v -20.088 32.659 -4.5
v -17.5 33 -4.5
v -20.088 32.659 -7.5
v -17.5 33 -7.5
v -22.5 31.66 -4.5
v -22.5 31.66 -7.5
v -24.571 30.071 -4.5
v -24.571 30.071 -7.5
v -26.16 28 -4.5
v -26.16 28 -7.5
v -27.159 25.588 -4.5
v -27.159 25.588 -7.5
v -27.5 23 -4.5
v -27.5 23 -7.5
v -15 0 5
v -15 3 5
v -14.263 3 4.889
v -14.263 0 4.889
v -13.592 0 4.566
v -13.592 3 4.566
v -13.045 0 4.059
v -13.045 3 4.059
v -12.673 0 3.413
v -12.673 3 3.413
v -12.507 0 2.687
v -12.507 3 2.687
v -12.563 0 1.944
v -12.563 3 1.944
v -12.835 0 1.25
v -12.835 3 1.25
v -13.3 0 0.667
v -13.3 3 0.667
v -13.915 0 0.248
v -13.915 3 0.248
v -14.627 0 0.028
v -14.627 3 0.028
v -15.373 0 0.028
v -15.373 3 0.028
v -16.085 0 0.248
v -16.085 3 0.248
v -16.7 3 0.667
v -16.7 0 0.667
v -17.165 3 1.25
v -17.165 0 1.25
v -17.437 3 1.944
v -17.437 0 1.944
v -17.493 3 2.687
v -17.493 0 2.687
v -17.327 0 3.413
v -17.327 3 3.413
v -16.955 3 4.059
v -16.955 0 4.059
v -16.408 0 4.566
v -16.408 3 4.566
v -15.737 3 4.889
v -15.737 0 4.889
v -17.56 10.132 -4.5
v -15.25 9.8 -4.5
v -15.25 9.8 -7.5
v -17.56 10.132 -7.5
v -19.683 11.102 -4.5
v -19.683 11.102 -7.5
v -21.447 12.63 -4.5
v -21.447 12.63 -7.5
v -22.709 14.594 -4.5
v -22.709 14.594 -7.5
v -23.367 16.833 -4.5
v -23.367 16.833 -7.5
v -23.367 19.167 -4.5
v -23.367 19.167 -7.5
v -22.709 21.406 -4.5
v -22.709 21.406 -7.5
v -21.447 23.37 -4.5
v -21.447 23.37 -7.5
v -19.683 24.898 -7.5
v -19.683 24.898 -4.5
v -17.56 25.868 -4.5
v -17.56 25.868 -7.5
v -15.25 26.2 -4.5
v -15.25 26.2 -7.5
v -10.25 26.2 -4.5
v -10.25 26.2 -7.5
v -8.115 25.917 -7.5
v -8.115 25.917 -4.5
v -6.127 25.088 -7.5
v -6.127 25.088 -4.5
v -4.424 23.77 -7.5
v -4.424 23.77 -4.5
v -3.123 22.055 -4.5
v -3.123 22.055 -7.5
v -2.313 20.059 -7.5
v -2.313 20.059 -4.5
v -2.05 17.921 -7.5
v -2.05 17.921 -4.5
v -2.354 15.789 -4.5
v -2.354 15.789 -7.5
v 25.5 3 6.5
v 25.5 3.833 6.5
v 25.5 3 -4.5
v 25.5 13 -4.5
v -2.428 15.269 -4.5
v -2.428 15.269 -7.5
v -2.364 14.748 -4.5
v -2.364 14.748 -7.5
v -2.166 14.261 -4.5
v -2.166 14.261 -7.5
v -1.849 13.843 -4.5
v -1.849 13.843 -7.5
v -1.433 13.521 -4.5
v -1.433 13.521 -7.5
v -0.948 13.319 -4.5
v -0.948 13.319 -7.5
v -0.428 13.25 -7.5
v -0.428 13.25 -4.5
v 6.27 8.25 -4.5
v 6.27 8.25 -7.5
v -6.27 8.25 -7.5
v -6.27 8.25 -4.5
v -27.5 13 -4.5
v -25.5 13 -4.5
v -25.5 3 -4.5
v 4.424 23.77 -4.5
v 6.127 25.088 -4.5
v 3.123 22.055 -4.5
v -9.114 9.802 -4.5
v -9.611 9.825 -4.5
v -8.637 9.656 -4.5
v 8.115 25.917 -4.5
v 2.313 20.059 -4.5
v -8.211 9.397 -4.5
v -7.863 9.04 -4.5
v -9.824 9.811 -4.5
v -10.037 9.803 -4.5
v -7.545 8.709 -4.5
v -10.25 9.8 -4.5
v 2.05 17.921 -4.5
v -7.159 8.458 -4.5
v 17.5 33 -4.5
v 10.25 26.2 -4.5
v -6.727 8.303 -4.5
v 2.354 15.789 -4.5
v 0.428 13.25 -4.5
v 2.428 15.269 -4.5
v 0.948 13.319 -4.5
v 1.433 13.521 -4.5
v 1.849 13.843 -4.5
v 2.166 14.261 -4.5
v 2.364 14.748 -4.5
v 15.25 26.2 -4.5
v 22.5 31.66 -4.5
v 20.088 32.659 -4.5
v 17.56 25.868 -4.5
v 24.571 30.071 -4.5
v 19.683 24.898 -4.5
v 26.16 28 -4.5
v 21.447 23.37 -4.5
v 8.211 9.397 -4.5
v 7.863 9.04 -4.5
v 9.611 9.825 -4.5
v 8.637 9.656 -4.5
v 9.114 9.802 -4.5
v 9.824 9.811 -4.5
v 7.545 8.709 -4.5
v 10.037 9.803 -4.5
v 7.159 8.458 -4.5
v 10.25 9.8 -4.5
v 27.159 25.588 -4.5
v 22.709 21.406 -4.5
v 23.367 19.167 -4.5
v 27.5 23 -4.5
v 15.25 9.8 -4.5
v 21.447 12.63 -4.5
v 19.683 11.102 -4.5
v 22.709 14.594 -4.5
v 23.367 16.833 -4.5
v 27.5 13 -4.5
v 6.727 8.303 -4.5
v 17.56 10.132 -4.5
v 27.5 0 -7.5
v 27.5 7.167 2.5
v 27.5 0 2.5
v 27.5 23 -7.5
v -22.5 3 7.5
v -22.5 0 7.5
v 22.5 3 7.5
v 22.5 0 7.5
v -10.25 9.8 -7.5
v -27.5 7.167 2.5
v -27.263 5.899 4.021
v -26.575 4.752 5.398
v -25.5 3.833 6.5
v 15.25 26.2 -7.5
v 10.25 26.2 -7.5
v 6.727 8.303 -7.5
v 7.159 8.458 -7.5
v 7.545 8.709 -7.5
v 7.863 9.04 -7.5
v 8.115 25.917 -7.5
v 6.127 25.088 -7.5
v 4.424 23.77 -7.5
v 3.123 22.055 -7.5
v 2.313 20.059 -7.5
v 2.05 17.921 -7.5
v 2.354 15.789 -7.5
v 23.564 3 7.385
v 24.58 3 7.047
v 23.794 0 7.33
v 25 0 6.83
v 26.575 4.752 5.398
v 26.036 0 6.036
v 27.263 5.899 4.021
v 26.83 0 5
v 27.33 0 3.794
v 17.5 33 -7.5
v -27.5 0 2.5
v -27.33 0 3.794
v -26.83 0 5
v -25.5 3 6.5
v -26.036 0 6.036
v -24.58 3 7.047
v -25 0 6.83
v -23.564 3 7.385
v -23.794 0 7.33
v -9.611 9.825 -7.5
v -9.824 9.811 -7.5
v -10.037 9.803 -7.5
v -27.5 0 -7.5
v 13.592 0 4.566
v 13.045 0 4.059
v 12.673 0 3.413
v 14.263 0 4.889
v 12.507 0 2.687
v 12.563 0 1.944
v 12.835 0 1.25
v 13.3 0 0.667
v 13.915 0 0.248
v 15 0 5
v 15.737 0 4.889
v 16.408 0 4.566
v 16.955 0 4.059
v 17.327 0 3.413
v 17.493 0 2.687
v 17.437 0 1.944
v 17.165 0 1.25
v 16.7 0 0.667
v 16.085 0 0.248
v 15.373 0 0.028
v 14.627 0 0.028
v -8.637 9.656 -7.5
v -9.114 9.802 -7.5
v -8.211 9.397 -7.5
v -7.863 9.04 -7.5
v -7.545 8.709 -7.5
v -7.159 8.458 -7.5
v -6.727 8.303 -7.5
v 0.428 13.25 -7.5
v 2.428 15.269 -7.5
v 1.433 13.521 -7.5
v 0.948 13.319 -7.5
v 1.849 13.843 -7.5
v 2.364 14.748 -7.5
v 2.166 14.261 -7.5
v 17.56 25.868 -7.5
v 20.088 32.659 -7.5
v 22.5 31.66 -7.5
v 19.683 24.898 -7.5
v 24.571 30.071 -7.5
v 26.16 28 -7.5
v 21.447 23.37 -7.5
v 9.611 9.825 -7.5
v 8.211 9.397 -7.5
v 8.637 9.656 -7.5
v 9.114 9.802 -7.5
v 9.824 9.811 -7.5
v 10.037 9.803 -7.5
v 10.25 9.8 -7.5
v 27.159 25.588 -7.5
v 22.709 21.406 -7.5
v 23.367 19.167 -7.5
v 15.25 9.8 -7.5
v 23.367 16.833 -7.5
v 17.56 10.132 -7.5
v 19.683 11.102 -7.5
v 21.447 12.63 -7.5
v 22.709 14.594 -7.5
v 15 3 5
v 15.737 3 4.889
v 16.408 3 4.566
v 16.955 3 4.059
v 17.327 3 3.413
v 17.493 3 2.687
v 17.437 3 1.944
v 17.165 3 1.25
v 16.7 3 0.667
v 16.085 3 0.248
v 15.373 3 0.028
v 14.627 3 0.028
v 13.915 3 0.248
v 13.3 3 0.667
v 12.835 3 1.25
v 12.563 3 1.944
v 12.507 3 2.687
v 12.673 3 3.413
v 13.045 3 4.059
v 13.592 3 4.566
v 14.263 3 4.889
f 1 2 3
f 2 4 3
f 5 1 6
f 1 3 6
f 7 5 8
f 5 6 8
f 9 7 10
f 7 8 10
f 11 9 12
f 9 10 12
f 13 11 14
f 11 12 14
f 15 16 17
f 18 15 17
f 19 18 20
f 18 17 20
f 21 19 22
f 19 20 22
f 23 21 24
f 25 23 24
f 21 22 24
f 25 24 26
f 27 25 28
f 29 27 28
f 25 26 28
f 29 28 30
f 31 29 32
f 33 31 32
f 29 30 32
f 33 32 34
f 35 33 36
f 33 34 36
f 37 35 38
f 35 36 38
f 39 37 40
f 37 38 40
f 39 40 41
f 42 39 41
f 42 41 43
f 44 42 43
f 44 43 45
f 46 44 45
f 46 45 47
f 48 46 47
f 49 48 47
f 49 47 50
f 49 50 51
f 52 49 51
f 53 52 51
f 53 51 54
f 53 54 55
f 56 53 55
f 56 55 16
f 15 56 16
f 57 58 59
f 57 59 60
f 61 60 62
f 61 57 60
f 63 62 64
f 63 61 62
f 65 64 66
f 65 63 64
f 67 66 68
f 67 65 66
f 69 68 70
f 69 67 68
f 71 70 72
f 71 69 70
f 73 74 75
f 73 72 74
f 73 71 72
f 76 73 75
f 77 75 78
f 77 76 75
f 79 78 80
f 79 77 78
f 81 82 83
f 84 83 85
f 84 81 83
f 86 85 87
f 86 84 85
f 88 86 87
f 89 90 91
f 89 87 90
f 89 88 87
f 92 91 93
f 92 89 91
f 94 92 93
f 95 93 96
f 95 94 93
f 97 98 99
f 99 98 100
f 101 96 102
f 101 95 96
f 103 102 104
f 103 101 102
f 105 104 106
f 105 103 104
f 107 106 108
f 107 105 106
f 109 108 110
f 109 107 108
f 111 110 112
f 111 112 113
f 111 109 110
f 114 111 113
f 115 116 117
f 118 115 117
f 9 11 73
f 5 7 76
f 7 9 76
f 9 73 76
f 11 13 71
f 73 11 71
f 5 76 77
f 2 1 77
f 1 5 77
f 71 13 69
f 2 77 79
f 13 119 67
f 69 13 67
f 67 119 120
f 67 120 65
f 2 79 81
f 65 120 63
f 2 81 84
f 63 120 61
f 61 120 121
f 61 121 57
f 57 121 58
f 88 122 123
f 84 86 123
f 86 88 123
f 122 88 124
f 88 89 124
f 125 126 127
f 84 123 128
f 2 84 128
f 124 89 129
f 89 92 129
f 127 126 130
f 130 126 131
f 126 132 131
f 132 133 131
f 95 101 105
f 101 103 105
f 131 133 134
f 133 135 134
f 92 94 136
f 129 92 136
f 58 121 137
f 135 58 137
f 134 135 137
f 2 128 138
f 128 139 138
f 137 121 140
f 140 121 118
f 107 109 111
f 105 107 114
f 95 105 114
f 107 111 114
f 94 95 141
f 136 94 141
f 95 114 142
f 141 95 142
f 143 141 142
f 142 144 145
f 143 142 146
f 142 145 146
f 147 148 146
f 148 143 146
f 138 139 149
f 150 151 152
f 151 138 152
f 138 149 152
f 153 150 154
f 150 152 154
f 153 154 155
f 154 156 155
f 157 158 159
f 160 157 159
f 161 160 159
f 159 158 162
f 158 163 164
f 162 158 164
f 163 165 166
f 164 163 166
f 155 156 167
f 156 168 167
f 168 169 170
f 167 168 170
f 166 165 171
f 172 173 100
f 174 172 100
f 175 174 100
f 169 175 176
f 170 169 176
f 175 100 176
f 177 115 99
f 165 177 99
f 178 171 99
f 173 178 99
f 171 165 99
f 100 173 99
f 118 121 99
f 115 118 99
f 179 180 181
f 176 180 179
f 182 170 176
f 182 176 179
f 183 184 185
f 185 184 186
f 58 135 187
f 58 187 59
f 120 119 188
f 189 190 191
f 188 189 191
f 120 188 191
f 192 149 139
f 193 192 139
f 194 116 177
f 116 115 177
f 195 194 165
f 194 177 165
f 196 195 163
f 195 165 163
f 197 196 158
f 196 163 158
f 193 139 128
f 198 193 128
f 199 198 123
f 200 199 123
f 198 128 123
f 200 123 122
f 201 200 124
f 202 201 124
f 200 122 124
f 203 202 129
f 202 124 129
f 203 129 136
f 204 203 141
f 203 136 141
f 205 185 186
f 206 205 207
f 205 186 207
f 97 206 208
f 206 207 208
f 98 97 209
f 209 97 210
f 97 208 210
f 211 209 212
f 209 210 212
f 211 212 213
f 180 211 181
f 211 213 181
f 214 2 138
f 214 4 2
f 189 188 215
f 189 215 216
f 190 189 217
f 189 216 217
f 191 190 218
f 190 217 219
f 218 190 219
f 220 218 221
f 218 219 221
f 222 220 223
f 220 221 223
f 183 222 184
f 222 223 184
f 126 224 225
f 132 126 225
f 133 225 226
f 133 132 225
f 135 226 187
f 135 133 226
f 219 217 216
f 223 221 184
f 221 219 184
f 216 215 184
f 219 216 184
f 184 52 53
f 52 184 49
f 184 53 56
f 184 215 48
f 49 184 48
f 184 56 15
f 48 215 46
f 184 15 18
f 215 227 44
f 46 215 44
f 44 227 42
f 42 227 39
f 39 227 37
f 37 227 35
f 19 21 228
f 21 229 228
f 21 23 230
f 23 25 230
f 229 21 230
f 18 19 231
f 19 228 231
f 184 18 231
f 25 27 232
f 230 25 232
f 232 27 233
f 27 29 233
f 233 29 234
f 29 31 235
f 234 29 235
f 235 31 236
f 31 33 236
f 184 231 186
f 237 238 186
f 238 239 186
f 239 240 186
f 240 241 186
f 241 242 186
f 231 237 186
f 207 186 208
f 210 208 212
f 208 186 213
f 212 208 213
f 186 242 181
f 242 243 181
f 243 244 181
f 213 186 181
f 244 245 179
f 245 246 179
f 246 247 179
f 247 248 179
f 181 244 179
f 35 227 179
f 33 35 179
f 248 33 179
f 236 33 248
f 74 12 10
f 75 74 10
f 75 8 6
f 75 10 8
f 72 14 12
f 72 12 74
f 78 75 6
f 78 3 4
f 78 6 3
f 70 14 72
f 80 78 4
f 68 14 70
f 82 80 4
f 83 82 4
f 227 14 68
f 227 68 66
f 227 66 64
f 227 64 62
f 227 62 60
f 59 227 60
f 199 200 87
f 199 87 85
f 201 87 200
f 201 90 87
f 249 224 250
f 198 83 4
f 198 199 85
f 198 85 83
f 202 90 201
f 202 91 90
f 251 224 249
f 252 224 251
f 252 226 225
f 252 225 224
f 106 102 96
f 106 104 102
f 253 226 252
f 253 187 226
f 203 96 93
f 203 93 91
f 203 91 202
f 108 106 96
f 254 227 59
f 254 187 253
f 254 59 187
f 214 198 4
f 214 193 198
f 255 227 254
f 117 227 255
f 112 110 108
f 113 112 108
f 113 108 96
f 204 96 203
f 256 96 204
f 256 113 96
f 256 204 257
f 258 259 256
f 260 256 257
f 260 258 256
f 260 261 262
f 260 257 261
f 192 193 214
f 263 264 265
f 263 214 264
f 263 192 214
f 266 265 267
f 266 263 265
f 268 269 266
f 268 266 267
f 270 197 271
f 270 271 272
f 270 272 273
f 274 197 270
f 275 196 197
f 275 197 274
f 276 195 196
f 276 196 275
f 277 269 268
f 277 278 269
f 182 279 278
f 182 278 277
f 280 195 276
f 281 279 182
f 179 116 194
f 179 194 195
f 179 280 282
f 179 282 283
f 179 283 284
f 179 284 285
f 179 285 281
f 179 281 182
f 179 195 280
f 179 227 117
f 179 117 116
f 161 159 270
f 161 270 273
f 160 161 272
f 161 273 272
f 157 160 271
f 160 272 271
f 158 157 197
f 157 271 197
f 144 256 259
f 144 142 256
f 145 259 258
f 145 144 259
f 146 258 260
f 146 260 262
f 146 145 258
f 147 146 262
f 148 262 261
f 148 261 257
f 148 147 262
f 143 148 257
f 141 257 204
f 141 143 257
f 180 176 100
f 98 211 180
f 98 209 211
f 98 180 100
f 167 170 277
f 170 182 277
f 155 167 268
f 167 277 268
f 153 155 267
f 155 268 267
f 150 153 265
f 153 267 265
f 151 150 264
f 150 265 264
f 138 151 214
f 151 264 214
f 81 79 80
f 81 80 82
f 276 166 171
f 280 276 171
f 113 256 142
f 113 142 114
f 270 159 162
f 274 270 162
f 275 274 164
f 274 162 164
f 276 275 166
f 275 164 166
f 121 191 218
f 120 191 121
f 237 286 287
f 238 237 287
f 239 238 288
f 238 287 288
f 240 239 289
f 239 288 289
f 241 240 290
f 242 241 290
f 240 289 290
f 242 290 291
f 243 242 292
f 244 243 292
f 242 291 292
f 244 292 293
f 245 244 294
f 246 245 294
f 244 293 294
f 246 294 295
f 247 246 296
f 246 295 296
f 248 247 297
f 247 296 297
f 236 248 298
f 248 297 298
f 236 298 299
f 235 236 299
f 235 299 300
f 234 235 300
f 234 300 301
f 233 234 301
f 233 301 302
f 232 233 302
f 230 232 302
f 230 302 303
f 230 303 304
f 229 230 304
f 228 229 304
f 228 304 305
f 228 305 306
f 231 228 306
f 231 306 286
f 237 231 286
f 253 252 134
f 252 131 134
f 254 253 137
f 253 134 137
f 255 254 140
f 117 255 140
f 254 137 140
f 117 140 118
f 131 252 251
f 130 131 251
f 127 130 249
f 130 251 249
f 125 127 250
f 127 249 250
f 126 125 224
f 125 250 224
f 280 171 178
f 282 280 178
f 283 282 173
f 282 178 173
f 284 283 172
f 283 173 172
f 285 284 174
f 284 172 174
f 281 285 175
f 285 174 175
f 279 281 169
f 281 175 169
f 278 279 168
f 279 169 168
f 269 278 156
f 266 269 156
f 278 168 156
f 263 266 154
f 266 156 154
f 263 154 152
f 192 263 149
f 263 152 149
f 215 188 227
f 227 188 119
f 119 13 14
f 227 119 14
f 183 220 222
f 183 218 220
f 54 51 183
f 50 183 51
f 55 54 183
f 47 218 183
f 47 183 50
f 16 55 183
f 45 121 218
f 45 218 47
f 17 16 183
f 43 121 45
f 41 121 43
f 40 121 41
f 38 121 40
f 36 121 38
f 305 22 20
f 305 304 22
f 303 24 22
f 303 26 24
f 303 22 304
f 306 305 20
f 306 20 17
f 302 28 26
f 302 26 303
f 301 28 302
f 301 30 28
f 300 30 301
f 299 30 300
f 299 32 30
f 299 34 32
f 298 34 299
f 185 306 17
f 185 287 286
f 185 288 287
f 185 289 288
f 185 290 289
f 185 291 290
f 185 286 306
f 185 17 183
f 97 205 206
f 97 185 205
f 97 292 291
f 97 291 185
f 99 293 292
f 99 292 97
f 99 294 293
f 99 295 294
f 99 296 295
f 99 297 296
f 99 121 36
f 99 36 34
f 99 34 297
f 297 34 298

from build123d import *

# Parameters (mm, degrees)
SKETCH1_W           = 55
SKETCH1_H           = 15
BOSS_EXTRUDE1_DEPTH = 3
SKETCH2_W           = 55
SKETCH2_H           = 3
BOSS_EXTRUDE2_DEPTH = 30
CUT_EXTRUDE1_DEPTH  = 30
SKETCH4_R           = 2.5
CUT_EXTRUDE2_DEPTH  = 30
BOSS_EXTRUDE3_DEPTH = 2
FILLET1_R           = 10
SKETCH6_W           = 15
SKETCH6_H           = 5
CUT_EXTRUDE3_DEPTH  = 10
FILLET2_R           = 2
FILLET3_R           = 2
FILLET4_R           = 2
FILLET5_R           = 5


with BuildPart() as part:
    # Sketch1 → Boss-Extrude1 (new body)
    with BuildSketch(Plane(origin=(0, 0, 0), x_dir=(1, 0, 0), z_dir=(0, 1, 0))):
        Rectangle(SKETCH1_W, SKETCH1_H)
    extrude(amount=BOSS_EXTRUDE1_DEPTH)

    # Sketch2 → Boss-Extrude2 (add)
    with BuildSketch(Plane(origin=(0, 3, 0), x_dir=(1, 0, 0), z_dir=(0, 1, 0))):
        with Locations((0, 6)):
            Rectangle(SKETCH2_W, SKETCH2_H)
    extrude(amount=BOSS_EXTRUDE2_DEPTH)

    # Sketch3 → Cut-Extrude1 (cut)
    with BuildSketch(Plane.XY.offset(-4.5)):
        with BuildLine():
            Line((-15.25, 26.2), (-10.25, 26.2))
            ThreePointArc((-10.25, 26.2), (-2.05, 18), (-10.25, 9.8))
            Line((-10.25, 9.8), (-15.25, 9.8))
            ThreePointArc((-15.25, 9.8), (-23.45, 18), (-15.25, 26.2))
        make_face()
        with BuildLine():
            Line((15.25, 26.2), (10.25, 26.2))
            ThreePointArc((10.25, 26.2), (2.05, 18), (10.25, 9.8))
            Line((10.25, 9.8), (15.25, 9.8))
            ThreePointArc((15.25, 9.8), (23.45, 18), (15.25, 26.2))
        make_face()
    extrude(amount=-CUT_EXTRUDE1_DEPTH, mode=Mode.SUBTRACT)

    # Sketch4 → Cut-Extrude2 (cut)
    with BuildSketch(Plane(origin=(0, 3, 0), x_dir=(1, 0, 0), z_dir=(0, 1, 0))):
        with Locations(Location((-15, -2.5, 0), (0, 0, 270))):
            Circle(SKETCH4_R)
        with Locations(Location((15, -2.5, 0), (0, 0, 270))):
            Circle(SKETCH4_R)
    extrude(amount=-CUT_EXTRUDE2_DEPTH, mode=Mode.SUBTRACT)

    # Sketch5 → Boss-Extrude3 (add)
    with BuildSketch(Plane.ZY.offset(27.5)):
        Polygon((7.5, 3), (-4.5, 3), (-4.5, 13), align=None)
    boss_extrude3 = extrude(amount=-BOSS_EXTRUDE3_DEPTH)

    # Mirror1: Boss-Extrude3 across plane
    add(boss_extrude3.mirror(Plane(origin=(0, 0, 0), x_dir=(0, 0, 1), z_dir=(1, 0, 0))))

    # Fillet1
    fillet1_edges = [part.edges().sort_by_distance(p)[0] for p in [
        (-27.5, 33, -6),
        (27.5, 33, -6),
    ]]
    fillet(fillet1_edges, radius=FILLET1_R)

    # Sketch6 → Cut-Extrude3 (cut)
    with BuildSketch(Plane(origin=(0, 0, -7.5), x_dir=(-1, 0, 0), z_dir=(0, 0, -1))):
        with Locations((0, 10.75)):
            Rectangle(SKETCH6_W, SKETCH6_H)
    extrude(amount=-CUT_EXTRUDE3_DEPTH, mode=Mode.SUBTRACT)

    # Fillet2
    # the kernel refuses this fillet: 2 mm, written as the material it takes off along each edge
    with BuildSketch(Plane(origin=(-7.5, 10.274878642, -12.896978856), x_dir=(0, -1, 0), z_dir=(0, 0, 1))) as fillet2_piece_1:
        with BuildLine():
            CenterArc((2.443897749, -1.9556132), FILLET2_R, 102.093612403, 82.373166868)
            Line((0.449972434, -2.111375318), (0.410093928, -2.11449056))
            ThreePointArc((0.410093928, -2.11449056), (0.255650409, -1.049152563), (-0.037683519, -0.013414634))
            Line((-0.037683519, -0.013414634), (0, 0.04))
            ThreePointArc((0, 0.04), (1.012439321, 0.04), (2.01649826, 0.039112264))
            Line((2.01649826, 0.039112264), (2.024878642, 0))
        make_face()
    extrude(amount=13.793957711, mode=Mode.SUBTRACT)
    with BuildSketch(Plane(origin=(7.5, 10.274878642, -12.896978856), x_dir=(0.9780357557406035, -0.2084371859647568, 0), z_dir=(0, 0, 1))) as fillet2_piece_2:
        with BuildLine():
            CenterArc((2.422058804, -1.98259687), FILLET2_R, 97.564003787, 82.373166868)
            Line((0.422060006, -1.980403713), (0.38206003, -1.980359849))
            ThreePointArc((0.38206003, -1.980359849), (0.171908573, -0.998539344), (-0.03912143, -0.008337487))
            Line((-0.03912143, -0.008337487), (0.005265345, 0.039651937))
            ThreePointArc((0.005265345, 0.039651937), (1.079395771, -0.031352833), (2.153526197, 0.039651937))
            Line((2.153526197, 0.039651937), (2.158791542, 0))
        make_face()
    extrude(amount=13.793957711, mode=Mode.SUBTRACT)

    # Fillet3
    fillet3_edges = [part.edges().sort_by_distance(p)[0] for p in [
        (-3.565877021, 13.25, -6),
        (3.565877021, 13.25, -6),
    ]]
    fillet(fillet3_edges, radius=FILLET3_R)

    # Fillet4
    fillet4_edges = [part.edges().sort_by_distance(p)[0] for p in [
        (-7.5, 8.25, -6),
        (7.5, 8.25, -6),
    ]]
    fillet(fillet4_edges, radius=FILLET4_R)

    # Fillet5
    # the kernel refuses this fillet: 5 mm, written as the material it takes off along each edge
    with BuildSketch(Plane(origin=(27.5, -12.5, 7.5), x_dir=(0, 0, -1), z_dir=(0, 1, 0))) as fillet5_piece_1:
        with BuildLine():
            CenterArc((FILLET5_R, FILLET5_R), FILLET5_R, 180, 90)
            Line((0, FILLET5_R), (0, 0))
            Line((0, 0), (FILLET5_R, 0))
        make_face()
    extrude(amount=28, mode=Mode.SUBTRACT)
    with BuildSketch(Plane(origin=(-27.5, -12.5, 7.5), x_dir=(0, 0, -1), z_dir=(0, 1, 0))) as fillet5_piece_2:
        with BuildLine():
            CenterArc((FILLET5_R, -FILLET5_R), FILLET5_R, 90, 90)
            Line((0, -FILLET5_R), (0, 0))
            Line((0, 0), (FILLET5_R, 0))
        make_face()
    extrude(amount=28, mode=Mode.SUBTRACT)


solid = part.part
